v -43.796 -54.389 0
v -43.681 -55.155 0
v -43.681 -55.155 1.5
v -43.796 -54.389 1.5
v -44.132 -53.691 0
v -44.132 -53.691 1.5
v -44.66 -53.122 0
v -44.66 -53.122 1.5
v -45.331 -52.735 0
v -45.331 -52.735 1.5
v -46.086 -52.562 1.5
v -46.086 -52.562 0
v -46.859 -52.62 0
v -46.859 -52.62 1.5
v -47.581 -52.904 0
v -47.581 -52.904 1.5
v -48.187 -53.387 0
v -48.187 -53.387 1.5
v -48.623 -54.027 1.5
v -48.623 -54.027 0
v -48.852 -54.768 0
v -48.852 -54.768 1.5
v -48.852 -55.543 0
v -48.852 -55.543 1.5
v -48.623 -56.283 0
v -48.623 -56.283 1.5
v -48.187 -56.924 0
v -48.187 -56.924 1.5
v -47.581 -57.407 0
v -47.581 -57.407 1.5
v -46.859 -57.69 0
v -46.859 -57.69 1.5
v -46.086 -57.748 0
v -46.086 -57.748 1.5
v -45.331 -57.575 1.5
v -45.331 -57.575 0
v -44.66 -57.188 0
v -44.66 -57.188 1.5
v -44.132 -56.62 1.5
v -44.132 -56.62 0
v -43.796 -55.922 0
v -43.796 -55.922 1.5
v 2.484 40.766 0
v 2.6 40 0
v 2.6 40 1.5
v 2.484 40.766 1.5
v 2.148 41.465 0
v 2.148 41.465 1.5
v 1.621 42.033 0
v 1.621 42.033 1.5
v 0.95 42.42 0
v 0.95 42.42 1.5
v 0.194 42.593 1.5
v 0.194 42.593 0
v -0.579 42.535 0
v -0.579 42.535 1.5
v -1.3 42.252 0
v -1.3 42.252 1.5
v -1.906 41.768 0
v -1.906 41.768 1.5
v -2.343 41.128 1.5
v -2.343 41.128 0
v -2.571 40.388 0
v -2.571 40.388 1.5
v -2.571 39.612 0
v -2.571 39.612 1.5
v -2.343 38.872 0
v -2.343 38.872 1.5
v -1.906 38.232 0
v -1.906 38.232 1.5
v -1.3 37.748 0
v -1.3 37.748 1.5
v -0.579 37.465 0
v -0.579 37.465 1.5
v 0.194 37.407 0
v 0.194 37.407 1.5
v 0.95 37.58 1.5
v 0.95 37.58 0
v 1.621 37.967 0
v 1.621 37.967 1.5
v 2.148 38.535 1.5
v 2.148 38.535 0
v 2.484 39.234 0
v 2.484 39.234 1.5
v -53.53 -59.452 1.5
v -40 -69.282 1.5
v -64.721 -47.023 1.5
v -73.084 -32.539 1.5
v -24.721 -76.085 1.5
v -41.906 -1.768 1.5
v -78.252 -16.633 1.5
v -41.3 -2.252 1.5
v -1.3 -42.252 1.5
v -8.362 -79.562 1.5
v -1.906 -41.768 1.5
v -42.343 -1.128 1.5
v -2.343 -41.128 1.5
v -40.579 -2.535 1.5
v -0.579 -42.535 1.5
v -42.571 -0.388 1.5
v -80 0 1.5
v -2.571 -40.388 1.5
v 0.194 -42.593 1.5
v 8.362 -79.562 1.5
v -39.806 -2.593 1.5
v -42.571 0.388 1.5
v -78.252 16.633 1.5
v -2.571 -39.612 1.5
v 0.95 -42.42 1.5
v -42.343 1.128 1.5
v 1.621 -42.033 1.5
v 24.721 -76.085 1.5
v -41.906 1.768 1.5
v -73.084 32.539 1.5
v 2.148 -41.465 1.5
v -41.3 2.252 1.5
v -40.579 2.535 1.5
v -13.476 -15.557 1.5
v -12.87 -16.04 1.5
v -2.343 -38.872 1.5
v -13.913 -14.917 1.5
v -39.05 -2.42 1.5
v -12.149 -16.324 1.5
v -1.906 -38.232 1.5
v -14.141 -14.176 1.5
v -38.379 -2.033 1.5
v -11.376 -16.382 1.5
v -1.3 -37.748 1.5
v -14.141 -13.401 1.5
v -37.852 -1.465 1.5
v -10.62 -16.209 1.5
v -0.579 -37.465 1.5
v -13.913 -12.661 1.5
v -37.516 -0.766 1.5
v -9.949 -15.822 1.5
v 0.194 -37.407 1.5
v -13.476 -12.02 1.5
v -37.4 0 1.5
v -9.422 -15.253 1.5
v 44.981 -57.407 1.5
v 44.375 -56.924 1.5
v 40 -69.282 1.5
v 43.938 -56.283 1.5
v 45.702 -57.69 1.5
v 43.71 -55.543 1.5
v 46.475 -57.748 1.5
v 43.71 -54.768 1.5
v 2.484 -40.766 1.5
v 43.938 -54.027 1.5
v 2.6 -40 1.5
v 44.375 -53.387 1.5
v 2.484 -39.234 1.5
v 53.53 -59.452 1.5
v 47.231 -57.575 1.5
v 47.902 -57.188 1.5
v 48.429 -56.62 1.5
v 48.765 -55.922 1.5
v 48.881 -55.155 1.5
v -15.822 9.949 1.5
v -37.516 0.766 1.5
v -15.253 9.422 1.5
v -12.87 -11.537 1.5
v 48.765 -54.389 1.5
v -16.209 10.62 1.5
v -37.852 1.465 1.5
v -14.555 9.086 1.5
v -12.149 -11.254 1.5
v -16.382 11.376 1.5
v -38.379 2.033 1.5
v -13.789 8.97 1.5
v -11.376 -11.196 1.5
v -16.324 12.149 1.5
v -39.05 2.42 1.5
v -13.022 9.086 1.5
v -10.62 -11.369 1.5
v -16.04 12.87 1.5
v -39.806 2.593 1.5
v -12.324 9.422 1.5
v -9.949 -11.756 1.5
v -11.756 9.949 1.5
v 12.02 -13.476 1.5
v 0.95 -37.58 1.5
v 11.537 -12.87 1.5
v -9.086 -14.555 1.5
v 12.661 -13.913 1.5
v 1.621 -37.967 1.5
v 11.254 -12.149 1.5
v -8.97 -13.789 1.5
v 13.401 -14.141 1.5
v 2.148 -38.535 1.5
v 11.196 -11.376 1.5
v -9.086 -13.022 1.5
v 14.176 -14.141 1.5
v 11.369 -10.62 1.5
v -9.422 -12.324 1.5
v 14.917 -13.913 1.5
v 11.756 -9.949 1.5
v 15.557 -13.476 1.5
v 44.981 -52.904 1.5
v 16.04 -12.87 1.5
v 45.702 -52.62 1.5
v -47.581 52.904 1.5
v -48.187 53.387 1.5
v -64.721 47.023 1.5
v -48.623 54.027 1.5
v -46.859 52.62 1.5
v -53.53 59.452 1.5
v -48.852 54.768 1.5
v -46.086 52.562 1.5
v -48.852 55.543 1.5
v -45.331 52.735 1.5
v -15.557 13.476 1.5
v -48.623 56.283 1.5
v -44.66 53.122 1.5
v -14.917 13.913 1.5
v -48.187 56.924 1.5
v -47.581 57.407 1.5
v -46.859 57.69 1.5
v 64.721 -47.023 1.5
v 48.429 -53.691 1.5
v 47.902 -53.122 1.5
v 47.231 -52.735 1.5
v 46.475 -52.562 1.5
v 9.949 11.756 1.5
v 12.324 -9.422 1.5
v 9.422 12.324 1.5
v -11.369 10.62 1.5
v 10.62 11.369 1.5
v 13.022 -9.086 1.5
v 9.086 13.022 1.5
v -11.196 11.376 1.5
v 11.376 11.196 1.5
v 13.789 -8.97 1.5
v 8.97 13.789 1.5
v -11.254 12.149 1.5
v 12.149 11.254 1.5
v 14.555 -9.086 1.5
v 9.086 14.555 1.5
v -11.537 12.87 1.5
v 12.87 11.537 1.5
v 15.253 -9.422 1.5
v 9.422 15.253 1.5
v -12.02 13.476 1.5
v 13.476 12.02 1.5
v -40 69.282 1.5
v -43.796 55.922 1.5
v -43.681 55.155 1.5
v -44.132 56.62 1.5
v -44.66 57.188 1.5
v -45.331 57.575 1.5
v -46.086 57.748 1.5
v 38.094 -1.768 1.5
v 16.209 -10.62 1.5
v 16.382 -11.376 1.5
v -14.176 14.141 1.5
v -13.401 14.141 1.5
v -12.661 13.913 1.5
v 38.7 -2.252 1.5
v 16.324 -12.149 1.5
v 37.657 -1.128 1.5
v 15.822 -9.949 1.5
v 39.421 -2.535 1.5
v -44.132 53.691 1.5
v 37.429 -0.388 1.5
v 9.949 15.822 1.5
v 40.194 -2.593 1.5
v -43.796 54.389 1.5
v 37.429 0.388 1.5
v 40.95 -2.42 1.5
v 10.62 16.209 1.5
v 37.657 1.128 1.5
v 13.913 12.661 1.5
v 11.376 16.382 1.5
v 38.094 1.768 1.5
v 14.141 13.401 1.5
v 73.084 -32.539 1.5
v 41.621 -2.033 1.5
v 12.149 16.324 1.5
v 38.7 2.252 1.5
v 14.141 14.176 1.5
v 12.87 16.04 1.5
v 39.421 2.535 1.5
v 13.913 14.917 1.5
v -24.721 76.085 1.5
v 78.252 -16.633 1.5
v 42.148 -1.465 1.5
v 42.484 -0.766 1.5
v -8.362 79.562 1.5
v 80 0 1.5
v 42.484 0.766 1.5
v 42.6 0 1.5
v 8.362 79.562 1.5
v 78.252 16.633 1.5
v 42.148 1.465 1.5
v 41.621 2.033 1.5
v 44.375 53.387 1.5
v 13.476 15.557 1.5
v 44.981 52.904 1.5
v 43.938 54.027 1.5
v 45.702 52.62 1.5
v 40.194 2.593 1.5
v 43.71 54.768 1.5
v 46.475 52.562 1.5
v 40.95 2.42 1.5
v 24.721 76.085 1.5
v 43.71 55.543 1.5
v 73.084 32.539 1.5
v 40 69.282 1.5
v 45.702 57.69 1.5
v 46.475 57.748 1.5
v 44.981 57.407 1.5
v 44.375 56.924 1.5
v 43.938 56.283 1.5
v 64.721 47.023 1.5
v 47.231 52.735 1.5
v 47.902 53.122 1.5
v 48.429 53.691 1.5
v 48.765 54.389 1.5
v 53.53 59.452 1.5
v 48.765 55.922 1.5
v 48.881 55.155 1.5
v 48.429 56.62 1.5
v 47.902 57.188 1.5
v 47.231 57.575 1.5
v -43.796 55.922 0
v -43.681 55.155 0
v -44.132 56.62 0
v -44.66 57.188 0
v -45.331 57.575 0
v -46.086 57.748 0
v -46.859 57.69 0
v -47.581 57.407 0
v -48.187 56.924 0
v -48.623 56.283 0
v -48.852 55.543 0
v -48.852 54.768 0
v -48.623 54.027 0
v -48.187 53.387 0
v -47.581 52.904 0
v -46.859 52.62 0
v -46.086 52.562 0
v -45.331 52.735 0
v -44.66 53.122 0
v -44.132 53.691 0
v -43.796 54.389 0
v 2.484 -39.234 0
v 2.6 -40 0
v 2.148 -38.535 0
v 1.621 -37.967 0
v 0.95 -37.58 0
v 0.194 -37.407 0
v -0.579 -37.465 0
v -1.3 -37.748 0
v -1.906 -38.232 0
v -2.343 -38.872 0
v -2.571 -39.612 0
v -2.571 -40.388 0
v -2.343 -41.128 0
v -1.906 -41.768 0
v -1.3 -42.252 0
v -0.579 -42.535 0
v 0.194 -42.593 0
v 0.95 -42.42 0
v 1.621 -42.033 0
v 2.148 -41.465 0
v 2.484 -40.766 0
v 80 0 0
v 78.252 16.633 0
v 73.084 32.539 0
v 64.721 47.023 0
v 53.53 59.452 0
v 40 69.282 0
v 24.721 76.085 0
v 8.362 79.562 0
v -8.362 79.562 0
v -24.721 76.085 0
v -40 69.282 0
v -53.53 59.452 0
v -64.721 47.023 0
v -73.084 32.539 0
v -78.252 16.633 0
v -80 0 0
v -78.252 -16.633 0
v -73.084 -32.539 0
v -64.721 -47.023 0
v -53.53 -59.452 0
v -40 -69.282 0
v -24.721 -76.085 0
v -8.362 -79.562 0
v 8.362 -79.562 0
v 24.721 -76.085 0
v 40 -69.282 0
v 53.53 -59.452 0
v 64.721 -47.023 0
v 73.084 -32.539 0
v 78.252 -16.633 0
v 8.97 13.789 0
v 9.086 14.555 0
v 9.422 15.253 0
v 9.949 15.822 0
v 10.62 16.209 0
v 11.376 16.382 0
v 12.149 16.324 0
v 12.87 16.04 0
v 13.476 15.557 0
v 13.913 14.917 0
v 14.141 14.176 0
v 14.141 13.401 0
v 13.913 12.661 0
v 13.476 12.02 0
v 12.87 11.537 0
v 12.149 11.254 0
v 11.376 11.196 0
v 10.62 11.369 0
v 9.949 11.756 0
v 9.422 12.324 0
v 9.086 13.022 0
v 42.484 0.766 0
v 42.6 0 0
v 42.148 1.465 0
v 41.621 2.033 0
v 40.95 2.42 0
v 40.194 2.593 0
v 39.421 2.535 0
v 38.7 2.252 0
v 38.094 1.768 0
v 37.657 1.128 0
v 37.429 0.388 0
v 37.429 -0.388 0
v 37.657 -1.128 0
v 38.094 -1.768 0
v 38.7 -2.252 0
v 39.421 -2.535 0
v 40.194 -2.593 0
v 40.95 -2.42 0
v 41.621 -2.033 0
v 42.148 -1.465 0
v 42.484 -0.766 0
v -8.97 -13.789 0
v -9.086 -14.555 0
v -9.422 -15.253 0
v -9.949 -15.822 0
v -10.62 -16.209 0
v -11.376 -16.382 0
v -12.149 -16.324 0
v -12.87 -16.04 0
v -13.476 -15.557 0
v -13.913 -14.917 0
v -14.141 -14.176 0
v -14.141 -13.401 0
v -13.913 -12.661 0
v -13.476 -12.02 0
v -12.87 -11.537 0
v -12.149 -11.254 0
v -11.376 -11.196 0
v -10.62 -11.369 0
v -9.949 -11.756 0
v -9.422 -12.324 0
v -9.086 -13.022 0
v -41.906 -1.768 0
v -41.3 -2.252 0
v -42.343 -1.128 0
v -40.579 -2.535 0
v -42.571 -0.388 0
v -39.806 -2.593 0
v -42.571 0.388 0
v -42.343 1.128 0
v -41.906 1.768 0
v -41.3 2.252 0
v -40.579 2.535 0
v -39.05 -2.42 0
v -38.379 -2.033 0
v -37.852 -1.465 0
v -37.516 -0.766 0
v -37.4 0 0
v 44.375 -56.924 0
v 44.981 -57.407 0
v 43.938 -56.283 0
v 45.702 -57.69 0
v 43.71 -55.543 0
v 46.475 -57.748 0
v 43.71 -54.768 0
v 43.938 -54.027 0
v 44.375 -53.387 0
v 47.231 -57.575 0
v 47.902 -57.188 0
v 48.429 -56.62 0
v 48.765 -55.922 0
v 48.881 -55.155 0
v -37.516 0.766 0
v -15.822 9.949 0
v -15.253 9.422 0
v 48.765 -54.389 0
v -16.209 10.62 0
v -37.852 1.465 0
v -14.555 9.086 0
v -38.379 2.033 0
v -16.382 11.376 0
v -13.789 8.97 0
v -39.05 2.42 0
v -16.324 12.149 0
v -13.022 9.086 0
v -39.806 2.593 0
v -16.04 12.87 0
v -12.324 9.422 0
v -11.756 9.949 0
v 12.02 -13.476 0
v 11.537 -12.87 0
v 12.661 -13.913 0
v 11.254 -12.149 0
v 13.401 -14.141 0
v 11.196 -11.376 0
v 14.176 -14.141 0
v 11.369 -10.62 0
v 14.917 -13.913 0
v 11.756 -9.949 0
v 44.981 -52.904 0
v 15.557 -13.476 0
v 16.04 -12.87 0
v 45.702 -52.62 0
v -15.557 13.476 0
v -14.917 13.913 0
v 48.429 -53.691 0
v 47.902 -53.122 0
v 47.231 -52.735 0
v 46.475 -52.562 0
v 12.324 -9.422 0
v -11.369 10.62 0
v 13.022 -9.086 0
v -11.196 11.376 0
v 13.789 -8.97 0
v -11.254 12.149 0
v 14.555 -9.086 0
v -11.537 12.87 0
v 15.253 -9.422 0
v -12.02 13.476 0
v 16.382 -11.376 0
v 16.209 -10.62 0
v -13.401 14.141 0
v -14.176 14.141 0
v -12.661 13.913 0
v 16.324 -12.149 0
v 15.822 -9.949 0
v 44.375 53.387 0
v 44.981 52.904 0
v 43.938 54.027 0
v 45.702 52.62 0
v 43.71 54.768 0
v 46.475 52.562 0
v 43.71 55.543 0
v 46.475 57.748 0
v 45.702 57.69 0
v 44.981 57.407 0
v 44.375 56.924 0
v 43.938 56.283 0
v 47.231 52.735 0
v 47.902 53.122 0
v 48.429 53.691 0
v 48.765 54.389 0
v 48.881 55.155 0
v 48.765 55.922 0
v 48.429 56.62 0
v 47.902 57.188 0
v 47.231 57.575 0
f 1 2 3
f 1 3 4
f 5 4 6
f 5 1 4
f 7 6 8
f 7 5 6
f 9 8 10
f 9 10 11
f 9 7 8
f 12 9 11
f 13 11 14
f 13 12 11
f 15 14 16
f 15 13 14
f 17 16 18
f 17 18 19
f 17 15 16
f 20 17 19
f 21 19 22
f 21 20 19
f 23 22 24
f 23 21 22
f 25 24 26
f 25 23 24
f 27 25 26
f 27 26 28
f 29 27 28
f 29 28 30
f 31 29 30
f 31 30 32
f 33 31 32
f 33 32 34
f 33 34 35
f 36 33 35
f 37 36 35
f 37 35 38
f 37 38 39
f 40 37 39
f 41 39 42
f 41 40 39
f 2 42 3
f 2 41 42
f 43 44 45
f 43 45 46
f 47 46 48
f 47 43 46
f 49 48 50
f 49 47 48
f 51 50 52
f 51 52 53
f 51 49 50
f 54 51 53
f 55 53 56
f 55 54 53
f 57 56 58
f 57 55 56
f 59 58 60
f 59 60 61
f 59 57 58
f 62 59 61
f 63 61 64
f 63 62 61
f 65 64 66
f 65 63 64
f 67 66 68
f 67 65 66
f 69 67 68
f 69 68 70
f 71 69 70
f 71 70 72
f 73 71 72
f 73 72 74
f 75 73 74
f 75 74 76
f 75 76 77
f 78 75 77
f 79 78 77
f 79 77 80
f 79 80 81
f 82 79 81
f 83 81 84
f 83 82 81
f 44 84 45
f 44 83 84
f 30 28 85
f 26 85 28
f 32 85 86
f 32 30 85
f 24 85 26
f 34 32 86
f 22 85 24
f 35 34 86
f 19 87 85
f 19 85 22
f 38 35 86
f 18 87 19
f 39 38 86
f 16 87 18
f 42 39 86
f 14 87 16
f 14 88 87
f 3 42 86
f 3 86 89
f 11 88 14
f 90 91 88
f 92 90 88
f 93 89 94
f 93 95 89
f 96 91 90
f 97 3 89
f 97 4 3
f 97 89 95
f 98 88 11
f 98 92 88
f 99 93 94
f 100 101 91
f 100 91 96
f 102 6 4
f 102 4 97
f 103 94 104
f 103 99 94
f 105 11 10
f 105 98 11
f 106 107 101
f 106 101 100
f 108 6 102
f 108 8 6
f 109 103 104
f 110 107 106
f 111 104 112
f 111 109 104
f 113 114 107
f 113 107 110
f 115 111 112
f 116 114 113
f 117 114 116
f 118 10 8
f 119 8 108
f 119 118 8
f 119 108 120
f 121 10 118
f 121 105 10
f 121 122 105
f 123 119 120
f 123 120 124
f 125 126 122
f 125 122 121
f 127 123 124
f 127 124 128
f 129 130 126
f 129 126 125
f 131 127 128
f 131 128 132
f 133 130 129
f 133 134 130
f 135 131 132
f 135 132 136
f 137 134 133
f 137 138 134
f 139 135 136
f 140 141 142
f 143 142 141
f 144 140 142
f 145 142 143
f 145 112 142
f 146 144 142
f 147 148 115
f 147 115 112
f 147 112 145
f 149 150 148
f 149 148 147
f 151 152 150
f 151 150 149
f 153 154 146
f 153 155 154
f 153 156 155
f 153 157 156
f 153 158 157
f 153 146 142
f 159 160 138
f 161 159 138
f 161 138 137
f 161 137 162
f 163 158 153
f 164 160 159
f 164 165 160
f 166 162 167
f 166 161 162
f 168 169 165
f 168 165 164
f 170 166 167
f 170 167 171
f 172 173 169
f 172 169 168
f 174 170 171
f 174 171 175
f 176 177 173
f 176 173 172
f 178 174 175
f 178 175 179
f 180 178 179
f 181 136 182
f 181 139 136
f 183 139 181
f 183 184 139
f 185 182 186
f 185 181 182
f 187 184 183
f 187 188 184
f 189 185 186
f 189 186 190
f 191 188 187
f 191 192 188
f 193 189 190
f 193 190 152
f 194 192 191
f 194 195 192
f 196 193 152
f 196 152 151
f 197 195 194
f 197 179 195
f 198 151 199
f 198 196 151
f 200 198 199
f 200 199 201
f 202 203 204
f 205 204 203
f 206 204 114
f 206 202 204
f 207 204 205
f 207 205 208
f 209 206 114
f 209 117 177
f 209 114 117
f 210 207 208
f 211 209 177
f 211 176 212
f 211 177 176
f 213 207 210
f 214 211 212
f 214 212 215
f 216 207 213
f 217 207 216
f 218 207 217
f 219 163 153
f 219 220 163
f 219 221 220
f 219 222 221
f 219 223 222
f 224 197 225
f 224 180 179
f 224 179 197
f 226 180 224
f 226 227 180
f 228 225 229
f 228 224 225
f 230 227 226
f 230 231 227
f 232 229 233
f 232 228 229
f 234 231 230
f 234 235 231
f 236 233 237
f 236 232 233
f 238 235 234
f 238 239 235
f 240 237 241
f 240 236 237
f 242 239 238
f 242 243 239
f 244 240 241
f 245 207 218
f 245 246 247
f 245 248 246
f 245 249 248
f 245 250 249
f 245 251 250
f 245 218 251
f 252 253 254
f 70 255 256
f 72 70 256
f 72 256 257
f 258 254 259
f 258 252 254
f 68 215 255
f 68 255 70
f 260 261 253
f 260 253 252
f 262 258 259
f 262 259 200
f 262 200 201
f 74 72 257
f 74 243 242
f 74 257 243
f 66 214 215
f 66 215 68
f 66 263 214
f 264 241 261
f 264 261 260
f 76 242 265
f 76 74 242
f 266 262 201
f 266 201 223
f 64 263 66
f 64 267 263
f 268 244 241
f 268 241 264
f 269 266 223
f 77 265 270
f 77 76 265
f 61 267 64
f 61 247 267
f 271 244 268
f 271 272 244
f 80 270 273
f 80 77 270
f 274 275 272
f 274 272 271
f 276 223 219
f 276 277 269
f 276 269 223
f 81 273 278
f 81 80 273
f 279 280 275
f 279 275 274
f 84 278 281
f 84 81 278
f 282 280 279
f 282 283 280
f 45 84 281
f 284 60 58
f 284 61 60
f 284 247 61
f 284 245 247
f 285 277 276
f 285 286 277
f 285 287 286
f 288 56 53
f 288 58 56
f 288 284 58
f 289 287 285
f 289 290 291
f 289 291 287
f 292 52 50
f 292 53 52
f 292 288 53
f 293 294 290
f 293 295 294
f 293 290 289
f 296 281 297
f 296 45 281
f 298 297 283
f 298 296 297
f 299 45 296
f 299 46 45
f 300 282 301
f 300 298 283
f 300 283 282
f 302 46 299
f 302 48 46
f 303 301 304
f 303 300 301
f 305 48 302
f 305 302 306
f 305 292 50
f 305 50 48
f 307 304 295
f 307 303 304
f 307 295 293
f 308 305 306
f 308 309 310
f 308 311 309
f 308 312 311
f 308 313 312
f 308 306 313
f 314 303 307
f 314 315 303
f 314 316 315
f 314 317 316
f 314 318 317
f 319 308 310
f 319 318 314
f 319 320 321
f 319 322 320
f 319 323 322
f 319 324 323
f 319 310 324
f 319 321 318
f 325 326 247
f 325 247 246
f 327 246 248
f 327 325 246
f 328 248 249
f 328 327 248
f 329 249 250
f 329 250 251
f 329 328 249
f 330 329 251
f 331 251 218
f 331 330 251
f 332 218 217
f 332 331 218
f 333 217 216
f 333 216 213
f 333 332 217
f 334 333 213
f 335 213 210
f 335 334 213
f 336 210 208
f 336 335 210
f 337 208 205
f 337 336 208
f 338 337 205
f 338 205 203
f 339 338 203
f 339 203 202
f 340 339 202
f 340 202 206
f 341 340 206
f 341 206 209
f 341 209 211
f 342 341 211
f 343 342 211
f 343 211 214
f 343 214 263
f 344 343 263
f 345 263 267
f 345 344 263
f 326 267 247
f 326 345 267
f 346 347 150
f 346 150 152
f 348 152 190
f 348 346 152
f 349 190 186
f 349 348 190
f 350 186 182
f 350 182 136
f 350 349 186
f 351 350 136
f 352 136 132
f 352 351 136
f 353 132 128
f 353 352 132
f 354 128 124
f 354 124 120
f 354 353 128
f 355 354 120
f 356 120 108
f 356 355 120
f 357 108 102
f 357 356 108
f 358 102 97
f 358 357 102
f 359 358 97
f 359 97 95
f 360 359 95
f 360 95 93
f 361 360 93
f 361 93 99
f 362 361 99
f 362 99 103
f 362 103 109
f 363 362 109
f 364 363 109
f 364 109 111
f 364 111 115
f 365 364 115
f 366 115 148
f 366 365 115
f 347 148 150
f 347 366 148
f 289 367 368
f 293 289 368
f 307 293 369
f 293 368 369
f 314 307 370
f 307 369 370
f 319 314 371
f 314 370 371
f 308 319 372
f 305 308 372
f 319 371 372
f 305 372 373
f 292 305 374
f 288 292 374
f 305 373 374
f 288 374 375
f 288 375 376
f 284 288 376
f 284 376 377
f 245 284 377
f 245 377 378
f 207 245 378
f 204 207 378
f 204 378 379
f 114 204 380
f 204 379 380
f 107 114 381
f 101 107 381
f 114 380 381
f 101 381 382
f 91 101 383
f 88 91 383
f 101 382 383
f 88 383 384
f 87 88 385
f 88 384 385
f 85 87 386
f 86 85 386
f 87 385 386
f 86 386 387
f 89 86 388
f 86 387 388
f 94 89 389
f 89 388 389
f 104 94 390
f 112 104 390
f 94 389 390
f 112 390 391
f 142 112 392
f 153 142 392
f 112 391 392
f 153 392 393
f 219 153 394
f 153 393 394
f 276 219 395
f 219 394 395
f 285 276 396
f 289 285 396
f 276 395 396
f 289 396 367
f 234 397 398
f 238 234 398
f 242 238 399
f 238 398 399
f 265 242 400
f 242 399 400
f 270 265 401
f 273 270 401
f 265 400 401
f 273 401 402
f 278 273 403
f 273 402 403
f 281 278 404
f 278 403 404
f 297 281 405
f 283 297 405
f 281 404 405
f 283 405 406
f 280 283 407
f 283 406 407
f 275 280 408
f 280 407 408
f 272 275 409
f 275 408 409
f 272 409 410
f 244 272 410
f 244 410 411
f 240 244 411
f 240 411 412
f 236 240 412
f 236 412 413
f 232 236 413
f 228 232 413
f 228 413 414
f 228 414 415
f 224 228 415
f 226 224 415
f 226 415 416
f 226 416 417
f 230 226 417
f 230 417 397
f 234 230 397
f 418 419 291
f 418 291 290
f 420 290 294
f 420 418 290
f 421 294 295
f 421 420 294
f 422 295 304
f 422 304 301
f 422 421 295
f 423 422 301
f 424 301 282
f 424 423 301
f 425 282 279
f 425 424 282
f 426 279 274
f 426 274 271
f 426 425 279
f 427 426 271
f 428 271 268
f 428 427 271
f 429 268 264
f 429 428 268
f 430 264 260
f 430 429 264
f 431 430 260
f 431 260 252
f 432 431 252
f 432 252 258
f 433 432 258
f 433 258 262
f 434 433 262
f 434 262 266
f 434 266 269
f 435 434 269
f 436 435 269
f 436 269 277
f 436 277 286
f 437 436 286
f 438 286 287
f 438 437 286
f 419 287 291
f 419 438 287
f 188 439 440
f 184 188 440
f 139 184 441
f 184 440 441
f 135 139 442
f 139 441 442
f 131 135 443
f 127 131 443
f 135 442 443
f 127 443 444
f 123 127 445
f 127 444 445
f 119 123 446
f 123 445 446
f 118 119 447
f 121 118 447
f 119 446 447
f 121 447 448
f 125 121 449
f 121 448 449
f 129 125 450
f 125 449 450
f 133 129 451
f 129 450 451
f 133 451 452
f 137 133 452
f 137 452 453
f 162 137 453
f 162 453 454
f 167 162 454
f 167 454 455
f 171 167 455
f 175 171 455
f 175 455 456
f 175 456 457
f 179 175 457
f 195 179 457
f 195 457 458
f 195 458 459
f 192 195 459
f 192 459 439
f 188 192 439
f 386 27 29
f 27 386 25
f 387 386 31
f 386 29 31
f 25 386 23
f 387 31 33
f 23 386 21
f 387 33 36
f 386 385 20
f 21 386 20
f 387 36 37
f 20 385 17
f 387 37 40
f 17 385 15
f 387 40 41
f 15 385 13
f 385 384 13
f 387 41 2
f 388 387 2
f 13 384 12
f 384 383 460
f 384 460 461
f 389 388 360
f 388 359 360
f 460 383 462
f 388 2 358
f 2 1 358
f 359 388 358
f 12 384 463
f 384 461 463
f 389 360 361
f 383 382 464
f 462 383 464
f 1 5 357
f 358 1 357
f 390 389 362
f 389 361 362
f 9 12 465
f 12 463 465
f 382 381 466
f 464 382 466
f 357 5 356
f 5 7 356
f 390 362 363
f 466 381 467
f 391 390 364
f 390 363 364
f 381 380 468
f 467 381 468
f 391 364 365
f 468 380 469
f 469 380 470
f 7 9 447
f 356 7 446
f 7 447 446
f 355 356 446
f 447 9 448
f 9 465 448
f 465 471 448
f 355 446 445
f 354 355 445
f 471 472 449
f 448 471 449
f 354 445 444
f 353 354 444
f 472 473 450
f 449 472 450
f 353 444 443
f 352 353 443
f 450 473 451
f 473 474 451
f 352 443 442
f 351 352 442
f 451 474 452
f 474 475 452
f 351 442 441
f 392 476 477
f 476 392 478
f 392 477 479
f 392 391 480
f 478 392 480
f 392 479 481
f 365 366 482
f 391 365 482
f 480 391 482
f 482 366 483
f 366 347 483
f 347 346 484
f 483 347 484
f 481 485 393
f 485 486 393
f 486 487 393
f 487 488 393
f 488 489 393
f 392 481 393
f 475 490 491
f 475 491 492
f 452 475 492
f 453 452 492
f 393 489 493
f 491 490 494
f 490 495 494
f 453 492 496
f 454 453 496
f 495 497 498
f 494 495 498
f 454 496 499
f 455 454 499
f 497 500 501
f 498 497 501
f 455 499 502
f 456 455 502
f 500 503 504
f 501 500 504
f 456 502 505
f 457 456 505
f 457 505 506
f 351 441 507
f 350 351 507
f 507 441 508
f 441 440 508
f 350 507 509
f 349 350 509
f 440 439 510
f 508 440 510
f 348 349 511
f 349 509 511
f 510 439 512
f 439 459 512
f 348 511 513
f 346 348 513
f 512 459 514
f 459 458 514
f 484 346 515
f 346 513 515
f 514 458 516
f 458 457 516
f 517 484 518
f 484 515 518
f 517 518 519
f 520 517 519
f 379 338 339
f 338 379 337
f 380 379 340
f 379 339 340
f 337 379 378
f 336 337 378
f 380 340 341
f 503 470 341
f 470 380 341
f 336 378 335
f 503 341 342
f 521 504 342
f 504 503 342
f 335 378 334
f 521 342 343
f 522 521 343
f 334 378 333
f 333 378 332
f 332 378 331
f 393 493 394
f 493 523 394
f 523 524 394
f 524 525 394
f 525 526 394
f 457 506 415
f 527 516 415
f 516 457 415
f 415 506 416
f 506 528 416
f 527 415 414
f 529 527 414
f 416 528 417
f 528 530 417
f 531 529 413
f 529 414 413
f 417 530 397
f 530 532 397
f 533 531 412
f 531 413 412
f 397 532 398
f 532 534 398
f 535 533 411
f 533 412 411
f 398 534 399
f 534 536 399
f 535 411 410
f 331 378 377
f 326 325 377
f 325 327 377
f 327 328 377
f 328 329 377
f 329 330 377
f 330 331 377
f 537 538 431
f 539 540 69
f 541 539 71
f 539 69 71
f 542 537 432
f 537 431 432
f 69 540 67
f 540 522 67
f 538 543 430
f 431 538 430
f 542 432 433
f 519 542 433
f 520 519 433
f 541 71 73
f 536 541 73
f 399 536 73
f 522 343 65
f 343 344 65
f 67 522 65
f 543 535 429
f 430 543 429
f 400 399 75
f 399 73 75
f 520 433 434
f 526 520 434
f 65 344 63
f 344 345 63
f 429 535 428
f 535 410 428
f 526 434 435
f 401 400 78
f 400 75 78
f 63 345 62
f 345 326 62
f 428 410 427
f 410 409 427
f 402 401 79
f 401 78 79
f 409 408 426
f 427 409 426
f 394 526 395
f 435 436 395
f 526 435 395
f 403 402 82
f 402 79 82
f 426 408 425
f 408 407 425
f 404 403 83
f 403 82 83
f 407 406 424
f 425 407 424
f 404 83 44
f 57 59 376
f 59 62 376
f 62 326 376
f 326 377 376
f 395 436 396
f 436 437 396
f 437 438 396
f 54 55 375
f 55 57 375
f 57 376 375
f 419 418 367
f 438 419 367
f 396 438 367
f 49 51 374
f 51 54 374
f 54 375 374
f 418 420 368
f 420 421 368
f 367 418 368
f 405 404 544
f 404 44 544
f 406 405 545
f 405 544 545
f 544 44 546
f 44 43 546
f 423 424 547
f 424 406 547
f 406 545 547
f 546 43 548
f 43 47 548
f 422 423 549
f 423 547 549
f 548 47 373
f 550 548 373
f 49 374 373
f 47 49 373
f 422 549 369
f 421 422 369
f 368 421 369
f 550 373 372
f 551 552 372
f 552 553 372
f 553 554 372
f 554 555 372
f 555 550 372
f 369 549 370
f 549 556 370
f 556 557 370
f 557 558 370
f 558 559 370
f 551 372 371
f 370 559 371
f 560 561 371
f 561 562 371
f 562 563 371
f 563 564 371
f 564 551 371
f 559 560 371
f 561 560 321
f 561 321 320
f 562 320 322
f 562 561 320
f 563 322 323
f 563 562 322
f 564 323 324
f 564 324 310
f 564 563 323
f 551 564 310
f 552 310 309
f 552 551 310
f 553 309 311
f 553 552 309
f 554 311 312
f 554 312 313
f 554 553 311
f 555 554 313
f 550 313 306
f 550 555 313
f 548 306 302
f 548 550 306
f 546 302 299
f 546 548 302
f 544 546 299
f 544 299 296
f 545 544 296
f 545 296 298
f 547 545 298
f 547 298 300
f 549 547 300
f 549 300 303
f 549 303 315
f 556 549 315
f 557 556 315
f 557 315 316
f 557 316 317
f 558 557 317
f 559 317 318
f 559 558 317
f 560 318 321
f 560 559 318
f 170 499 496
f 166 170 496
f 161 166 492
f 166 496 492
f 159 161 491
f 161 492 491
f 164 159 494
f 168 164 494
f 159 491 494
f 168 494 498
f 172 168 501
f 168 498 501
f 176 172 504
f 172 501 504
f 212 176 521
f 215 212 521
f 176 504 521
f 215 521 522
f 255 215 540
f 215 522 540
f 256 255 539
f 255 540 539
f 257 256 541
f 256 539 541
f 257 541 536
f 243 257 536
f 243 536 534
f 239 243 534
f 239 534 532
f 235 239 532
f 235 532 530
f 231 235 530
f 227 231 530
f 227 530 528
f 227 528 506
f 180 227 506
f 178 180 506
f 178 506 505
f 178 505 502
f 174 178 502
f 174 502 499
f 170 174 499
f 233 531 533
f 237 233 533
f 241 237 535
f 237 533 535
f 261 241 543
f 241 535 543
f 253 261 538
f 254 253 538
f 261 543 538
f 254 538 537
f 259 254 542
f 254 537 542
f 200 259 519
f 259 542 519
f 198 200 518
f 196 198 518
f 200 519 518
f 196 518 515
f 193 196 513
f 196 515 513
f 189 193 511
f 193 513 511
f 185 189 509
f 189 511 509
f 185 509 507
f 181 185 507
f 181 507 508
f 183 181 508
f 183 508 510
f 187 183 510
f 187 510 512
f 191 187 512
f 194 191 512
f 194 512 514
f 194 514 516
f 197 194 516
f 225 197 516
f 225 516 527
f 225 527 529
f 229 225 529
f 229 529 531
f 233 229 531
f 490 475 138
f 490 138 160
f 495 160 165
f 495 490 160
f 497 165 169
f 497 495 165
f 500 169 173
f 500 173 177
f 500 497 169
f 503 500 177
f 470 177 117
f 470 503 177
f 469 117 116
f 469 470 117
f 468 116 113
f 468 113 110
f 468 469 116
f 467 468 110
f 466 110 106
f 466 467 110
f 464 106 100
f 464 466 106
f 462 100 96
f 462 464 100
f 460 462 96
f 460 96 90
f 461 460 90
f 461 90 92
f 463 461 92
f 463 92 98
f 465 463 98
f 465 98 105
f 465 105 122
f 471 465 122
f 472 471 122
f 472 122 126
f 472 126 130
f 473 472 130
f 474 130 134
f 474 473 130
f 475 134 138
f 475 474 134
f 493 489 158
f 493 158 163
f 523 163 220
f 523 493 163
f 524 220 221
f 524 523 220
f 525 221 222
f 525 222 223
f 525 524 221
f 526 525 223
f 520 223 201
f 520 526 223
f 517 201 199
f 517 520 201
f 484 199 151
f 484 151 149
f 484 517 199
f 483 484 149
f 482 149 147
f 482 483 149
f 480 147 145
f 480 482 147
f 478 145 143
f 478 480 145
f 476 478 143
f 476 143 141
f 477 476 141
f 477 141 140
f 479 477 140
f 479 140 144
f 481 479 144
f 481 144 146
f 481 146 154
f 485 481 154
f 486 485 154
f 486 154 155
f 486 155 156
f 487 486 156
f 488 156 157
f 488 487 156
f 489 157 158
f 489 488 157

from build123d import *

# Parameters (mm, degrees)
SKETCH1_R           = 80
SKETCH1_R_2         = 2.6
BOSS_EXTRUDE1_DEPTH = 1.5
SKETCH2_R           = 2.6
CUT_EXTRUDE1_DEPTH  = 10
CIRPATTERN1_COUNT   = 4


with BuildPart() as part:
    # Sketch1 → Boss-Extrude1 (new body)
    with BuildSketch(Plane.XY):
        Circle(SKETCH1_R)
        with Locations((-46.280707897, 55.155199905)):
            Circle(SKETCH1_R_2, mode=Mode.SUBTRACT)
        with Locations((-46.280707897, -55.155199905)):
            Circle(SKETCH1_R_2, mode=Mode.SUBTRACT)
        with Locations((46.280707897, -55.155199905)):
            Circle(SKETCH1_R_2, mode=Mode.SUBTRACT)
        with Locations((46.280707897, 55.155199905)):
            Circle(SKETCH1_R_2, mode=Mode.SUBTRACT)
        with Locations((0, 40)):
            Circle(SKETCH1_R_2, mode=Mode.SUBTRACT)
        with Locations((40, 0)):
            Circle(SKETCH1_R_2, mode=Mode.SUBTRACT)
        with Locations((0, -40)):
            Circle(SKETCH1_R_2, mode=Mode.SUBTRACT)
        with Locations((-40, 0)):
            Circle(SKETCH1_R_2, mode=Mode.SUBTRACT)
    extrude(amount=BOSS_EXTRUDE1_DEPTH)

    # Sketch2 → Cut-Extrude1 (cut)
    with BuildSketch(Plane(origin=(0, 0, 0), x_dir=(-1, 0, 0), z_dir=(0, 0, -1))):
        with Locations((-11.570176974, 13.788799976)):
            Circle(SKETCH2_R)
    cut_extrude1 = extrude(amount=-CUT_EXTRUDE1_DEPTH, mode=Mode.SUBTRACT)

    # CirPattern1: Cut-Extrude1 ×4 about axis
    cirpattern1_axis = Axis((0, 0, 0), (0, 0, 1))
    for i in range(1, CIRPATTERN1_COUNT):
        add(cut_extrude1.rotate(cirpattern1_axis, i * 360 / CIRPATTERN1_COUNT), mode=Mode.SUBTRACT)


solid = part.part
